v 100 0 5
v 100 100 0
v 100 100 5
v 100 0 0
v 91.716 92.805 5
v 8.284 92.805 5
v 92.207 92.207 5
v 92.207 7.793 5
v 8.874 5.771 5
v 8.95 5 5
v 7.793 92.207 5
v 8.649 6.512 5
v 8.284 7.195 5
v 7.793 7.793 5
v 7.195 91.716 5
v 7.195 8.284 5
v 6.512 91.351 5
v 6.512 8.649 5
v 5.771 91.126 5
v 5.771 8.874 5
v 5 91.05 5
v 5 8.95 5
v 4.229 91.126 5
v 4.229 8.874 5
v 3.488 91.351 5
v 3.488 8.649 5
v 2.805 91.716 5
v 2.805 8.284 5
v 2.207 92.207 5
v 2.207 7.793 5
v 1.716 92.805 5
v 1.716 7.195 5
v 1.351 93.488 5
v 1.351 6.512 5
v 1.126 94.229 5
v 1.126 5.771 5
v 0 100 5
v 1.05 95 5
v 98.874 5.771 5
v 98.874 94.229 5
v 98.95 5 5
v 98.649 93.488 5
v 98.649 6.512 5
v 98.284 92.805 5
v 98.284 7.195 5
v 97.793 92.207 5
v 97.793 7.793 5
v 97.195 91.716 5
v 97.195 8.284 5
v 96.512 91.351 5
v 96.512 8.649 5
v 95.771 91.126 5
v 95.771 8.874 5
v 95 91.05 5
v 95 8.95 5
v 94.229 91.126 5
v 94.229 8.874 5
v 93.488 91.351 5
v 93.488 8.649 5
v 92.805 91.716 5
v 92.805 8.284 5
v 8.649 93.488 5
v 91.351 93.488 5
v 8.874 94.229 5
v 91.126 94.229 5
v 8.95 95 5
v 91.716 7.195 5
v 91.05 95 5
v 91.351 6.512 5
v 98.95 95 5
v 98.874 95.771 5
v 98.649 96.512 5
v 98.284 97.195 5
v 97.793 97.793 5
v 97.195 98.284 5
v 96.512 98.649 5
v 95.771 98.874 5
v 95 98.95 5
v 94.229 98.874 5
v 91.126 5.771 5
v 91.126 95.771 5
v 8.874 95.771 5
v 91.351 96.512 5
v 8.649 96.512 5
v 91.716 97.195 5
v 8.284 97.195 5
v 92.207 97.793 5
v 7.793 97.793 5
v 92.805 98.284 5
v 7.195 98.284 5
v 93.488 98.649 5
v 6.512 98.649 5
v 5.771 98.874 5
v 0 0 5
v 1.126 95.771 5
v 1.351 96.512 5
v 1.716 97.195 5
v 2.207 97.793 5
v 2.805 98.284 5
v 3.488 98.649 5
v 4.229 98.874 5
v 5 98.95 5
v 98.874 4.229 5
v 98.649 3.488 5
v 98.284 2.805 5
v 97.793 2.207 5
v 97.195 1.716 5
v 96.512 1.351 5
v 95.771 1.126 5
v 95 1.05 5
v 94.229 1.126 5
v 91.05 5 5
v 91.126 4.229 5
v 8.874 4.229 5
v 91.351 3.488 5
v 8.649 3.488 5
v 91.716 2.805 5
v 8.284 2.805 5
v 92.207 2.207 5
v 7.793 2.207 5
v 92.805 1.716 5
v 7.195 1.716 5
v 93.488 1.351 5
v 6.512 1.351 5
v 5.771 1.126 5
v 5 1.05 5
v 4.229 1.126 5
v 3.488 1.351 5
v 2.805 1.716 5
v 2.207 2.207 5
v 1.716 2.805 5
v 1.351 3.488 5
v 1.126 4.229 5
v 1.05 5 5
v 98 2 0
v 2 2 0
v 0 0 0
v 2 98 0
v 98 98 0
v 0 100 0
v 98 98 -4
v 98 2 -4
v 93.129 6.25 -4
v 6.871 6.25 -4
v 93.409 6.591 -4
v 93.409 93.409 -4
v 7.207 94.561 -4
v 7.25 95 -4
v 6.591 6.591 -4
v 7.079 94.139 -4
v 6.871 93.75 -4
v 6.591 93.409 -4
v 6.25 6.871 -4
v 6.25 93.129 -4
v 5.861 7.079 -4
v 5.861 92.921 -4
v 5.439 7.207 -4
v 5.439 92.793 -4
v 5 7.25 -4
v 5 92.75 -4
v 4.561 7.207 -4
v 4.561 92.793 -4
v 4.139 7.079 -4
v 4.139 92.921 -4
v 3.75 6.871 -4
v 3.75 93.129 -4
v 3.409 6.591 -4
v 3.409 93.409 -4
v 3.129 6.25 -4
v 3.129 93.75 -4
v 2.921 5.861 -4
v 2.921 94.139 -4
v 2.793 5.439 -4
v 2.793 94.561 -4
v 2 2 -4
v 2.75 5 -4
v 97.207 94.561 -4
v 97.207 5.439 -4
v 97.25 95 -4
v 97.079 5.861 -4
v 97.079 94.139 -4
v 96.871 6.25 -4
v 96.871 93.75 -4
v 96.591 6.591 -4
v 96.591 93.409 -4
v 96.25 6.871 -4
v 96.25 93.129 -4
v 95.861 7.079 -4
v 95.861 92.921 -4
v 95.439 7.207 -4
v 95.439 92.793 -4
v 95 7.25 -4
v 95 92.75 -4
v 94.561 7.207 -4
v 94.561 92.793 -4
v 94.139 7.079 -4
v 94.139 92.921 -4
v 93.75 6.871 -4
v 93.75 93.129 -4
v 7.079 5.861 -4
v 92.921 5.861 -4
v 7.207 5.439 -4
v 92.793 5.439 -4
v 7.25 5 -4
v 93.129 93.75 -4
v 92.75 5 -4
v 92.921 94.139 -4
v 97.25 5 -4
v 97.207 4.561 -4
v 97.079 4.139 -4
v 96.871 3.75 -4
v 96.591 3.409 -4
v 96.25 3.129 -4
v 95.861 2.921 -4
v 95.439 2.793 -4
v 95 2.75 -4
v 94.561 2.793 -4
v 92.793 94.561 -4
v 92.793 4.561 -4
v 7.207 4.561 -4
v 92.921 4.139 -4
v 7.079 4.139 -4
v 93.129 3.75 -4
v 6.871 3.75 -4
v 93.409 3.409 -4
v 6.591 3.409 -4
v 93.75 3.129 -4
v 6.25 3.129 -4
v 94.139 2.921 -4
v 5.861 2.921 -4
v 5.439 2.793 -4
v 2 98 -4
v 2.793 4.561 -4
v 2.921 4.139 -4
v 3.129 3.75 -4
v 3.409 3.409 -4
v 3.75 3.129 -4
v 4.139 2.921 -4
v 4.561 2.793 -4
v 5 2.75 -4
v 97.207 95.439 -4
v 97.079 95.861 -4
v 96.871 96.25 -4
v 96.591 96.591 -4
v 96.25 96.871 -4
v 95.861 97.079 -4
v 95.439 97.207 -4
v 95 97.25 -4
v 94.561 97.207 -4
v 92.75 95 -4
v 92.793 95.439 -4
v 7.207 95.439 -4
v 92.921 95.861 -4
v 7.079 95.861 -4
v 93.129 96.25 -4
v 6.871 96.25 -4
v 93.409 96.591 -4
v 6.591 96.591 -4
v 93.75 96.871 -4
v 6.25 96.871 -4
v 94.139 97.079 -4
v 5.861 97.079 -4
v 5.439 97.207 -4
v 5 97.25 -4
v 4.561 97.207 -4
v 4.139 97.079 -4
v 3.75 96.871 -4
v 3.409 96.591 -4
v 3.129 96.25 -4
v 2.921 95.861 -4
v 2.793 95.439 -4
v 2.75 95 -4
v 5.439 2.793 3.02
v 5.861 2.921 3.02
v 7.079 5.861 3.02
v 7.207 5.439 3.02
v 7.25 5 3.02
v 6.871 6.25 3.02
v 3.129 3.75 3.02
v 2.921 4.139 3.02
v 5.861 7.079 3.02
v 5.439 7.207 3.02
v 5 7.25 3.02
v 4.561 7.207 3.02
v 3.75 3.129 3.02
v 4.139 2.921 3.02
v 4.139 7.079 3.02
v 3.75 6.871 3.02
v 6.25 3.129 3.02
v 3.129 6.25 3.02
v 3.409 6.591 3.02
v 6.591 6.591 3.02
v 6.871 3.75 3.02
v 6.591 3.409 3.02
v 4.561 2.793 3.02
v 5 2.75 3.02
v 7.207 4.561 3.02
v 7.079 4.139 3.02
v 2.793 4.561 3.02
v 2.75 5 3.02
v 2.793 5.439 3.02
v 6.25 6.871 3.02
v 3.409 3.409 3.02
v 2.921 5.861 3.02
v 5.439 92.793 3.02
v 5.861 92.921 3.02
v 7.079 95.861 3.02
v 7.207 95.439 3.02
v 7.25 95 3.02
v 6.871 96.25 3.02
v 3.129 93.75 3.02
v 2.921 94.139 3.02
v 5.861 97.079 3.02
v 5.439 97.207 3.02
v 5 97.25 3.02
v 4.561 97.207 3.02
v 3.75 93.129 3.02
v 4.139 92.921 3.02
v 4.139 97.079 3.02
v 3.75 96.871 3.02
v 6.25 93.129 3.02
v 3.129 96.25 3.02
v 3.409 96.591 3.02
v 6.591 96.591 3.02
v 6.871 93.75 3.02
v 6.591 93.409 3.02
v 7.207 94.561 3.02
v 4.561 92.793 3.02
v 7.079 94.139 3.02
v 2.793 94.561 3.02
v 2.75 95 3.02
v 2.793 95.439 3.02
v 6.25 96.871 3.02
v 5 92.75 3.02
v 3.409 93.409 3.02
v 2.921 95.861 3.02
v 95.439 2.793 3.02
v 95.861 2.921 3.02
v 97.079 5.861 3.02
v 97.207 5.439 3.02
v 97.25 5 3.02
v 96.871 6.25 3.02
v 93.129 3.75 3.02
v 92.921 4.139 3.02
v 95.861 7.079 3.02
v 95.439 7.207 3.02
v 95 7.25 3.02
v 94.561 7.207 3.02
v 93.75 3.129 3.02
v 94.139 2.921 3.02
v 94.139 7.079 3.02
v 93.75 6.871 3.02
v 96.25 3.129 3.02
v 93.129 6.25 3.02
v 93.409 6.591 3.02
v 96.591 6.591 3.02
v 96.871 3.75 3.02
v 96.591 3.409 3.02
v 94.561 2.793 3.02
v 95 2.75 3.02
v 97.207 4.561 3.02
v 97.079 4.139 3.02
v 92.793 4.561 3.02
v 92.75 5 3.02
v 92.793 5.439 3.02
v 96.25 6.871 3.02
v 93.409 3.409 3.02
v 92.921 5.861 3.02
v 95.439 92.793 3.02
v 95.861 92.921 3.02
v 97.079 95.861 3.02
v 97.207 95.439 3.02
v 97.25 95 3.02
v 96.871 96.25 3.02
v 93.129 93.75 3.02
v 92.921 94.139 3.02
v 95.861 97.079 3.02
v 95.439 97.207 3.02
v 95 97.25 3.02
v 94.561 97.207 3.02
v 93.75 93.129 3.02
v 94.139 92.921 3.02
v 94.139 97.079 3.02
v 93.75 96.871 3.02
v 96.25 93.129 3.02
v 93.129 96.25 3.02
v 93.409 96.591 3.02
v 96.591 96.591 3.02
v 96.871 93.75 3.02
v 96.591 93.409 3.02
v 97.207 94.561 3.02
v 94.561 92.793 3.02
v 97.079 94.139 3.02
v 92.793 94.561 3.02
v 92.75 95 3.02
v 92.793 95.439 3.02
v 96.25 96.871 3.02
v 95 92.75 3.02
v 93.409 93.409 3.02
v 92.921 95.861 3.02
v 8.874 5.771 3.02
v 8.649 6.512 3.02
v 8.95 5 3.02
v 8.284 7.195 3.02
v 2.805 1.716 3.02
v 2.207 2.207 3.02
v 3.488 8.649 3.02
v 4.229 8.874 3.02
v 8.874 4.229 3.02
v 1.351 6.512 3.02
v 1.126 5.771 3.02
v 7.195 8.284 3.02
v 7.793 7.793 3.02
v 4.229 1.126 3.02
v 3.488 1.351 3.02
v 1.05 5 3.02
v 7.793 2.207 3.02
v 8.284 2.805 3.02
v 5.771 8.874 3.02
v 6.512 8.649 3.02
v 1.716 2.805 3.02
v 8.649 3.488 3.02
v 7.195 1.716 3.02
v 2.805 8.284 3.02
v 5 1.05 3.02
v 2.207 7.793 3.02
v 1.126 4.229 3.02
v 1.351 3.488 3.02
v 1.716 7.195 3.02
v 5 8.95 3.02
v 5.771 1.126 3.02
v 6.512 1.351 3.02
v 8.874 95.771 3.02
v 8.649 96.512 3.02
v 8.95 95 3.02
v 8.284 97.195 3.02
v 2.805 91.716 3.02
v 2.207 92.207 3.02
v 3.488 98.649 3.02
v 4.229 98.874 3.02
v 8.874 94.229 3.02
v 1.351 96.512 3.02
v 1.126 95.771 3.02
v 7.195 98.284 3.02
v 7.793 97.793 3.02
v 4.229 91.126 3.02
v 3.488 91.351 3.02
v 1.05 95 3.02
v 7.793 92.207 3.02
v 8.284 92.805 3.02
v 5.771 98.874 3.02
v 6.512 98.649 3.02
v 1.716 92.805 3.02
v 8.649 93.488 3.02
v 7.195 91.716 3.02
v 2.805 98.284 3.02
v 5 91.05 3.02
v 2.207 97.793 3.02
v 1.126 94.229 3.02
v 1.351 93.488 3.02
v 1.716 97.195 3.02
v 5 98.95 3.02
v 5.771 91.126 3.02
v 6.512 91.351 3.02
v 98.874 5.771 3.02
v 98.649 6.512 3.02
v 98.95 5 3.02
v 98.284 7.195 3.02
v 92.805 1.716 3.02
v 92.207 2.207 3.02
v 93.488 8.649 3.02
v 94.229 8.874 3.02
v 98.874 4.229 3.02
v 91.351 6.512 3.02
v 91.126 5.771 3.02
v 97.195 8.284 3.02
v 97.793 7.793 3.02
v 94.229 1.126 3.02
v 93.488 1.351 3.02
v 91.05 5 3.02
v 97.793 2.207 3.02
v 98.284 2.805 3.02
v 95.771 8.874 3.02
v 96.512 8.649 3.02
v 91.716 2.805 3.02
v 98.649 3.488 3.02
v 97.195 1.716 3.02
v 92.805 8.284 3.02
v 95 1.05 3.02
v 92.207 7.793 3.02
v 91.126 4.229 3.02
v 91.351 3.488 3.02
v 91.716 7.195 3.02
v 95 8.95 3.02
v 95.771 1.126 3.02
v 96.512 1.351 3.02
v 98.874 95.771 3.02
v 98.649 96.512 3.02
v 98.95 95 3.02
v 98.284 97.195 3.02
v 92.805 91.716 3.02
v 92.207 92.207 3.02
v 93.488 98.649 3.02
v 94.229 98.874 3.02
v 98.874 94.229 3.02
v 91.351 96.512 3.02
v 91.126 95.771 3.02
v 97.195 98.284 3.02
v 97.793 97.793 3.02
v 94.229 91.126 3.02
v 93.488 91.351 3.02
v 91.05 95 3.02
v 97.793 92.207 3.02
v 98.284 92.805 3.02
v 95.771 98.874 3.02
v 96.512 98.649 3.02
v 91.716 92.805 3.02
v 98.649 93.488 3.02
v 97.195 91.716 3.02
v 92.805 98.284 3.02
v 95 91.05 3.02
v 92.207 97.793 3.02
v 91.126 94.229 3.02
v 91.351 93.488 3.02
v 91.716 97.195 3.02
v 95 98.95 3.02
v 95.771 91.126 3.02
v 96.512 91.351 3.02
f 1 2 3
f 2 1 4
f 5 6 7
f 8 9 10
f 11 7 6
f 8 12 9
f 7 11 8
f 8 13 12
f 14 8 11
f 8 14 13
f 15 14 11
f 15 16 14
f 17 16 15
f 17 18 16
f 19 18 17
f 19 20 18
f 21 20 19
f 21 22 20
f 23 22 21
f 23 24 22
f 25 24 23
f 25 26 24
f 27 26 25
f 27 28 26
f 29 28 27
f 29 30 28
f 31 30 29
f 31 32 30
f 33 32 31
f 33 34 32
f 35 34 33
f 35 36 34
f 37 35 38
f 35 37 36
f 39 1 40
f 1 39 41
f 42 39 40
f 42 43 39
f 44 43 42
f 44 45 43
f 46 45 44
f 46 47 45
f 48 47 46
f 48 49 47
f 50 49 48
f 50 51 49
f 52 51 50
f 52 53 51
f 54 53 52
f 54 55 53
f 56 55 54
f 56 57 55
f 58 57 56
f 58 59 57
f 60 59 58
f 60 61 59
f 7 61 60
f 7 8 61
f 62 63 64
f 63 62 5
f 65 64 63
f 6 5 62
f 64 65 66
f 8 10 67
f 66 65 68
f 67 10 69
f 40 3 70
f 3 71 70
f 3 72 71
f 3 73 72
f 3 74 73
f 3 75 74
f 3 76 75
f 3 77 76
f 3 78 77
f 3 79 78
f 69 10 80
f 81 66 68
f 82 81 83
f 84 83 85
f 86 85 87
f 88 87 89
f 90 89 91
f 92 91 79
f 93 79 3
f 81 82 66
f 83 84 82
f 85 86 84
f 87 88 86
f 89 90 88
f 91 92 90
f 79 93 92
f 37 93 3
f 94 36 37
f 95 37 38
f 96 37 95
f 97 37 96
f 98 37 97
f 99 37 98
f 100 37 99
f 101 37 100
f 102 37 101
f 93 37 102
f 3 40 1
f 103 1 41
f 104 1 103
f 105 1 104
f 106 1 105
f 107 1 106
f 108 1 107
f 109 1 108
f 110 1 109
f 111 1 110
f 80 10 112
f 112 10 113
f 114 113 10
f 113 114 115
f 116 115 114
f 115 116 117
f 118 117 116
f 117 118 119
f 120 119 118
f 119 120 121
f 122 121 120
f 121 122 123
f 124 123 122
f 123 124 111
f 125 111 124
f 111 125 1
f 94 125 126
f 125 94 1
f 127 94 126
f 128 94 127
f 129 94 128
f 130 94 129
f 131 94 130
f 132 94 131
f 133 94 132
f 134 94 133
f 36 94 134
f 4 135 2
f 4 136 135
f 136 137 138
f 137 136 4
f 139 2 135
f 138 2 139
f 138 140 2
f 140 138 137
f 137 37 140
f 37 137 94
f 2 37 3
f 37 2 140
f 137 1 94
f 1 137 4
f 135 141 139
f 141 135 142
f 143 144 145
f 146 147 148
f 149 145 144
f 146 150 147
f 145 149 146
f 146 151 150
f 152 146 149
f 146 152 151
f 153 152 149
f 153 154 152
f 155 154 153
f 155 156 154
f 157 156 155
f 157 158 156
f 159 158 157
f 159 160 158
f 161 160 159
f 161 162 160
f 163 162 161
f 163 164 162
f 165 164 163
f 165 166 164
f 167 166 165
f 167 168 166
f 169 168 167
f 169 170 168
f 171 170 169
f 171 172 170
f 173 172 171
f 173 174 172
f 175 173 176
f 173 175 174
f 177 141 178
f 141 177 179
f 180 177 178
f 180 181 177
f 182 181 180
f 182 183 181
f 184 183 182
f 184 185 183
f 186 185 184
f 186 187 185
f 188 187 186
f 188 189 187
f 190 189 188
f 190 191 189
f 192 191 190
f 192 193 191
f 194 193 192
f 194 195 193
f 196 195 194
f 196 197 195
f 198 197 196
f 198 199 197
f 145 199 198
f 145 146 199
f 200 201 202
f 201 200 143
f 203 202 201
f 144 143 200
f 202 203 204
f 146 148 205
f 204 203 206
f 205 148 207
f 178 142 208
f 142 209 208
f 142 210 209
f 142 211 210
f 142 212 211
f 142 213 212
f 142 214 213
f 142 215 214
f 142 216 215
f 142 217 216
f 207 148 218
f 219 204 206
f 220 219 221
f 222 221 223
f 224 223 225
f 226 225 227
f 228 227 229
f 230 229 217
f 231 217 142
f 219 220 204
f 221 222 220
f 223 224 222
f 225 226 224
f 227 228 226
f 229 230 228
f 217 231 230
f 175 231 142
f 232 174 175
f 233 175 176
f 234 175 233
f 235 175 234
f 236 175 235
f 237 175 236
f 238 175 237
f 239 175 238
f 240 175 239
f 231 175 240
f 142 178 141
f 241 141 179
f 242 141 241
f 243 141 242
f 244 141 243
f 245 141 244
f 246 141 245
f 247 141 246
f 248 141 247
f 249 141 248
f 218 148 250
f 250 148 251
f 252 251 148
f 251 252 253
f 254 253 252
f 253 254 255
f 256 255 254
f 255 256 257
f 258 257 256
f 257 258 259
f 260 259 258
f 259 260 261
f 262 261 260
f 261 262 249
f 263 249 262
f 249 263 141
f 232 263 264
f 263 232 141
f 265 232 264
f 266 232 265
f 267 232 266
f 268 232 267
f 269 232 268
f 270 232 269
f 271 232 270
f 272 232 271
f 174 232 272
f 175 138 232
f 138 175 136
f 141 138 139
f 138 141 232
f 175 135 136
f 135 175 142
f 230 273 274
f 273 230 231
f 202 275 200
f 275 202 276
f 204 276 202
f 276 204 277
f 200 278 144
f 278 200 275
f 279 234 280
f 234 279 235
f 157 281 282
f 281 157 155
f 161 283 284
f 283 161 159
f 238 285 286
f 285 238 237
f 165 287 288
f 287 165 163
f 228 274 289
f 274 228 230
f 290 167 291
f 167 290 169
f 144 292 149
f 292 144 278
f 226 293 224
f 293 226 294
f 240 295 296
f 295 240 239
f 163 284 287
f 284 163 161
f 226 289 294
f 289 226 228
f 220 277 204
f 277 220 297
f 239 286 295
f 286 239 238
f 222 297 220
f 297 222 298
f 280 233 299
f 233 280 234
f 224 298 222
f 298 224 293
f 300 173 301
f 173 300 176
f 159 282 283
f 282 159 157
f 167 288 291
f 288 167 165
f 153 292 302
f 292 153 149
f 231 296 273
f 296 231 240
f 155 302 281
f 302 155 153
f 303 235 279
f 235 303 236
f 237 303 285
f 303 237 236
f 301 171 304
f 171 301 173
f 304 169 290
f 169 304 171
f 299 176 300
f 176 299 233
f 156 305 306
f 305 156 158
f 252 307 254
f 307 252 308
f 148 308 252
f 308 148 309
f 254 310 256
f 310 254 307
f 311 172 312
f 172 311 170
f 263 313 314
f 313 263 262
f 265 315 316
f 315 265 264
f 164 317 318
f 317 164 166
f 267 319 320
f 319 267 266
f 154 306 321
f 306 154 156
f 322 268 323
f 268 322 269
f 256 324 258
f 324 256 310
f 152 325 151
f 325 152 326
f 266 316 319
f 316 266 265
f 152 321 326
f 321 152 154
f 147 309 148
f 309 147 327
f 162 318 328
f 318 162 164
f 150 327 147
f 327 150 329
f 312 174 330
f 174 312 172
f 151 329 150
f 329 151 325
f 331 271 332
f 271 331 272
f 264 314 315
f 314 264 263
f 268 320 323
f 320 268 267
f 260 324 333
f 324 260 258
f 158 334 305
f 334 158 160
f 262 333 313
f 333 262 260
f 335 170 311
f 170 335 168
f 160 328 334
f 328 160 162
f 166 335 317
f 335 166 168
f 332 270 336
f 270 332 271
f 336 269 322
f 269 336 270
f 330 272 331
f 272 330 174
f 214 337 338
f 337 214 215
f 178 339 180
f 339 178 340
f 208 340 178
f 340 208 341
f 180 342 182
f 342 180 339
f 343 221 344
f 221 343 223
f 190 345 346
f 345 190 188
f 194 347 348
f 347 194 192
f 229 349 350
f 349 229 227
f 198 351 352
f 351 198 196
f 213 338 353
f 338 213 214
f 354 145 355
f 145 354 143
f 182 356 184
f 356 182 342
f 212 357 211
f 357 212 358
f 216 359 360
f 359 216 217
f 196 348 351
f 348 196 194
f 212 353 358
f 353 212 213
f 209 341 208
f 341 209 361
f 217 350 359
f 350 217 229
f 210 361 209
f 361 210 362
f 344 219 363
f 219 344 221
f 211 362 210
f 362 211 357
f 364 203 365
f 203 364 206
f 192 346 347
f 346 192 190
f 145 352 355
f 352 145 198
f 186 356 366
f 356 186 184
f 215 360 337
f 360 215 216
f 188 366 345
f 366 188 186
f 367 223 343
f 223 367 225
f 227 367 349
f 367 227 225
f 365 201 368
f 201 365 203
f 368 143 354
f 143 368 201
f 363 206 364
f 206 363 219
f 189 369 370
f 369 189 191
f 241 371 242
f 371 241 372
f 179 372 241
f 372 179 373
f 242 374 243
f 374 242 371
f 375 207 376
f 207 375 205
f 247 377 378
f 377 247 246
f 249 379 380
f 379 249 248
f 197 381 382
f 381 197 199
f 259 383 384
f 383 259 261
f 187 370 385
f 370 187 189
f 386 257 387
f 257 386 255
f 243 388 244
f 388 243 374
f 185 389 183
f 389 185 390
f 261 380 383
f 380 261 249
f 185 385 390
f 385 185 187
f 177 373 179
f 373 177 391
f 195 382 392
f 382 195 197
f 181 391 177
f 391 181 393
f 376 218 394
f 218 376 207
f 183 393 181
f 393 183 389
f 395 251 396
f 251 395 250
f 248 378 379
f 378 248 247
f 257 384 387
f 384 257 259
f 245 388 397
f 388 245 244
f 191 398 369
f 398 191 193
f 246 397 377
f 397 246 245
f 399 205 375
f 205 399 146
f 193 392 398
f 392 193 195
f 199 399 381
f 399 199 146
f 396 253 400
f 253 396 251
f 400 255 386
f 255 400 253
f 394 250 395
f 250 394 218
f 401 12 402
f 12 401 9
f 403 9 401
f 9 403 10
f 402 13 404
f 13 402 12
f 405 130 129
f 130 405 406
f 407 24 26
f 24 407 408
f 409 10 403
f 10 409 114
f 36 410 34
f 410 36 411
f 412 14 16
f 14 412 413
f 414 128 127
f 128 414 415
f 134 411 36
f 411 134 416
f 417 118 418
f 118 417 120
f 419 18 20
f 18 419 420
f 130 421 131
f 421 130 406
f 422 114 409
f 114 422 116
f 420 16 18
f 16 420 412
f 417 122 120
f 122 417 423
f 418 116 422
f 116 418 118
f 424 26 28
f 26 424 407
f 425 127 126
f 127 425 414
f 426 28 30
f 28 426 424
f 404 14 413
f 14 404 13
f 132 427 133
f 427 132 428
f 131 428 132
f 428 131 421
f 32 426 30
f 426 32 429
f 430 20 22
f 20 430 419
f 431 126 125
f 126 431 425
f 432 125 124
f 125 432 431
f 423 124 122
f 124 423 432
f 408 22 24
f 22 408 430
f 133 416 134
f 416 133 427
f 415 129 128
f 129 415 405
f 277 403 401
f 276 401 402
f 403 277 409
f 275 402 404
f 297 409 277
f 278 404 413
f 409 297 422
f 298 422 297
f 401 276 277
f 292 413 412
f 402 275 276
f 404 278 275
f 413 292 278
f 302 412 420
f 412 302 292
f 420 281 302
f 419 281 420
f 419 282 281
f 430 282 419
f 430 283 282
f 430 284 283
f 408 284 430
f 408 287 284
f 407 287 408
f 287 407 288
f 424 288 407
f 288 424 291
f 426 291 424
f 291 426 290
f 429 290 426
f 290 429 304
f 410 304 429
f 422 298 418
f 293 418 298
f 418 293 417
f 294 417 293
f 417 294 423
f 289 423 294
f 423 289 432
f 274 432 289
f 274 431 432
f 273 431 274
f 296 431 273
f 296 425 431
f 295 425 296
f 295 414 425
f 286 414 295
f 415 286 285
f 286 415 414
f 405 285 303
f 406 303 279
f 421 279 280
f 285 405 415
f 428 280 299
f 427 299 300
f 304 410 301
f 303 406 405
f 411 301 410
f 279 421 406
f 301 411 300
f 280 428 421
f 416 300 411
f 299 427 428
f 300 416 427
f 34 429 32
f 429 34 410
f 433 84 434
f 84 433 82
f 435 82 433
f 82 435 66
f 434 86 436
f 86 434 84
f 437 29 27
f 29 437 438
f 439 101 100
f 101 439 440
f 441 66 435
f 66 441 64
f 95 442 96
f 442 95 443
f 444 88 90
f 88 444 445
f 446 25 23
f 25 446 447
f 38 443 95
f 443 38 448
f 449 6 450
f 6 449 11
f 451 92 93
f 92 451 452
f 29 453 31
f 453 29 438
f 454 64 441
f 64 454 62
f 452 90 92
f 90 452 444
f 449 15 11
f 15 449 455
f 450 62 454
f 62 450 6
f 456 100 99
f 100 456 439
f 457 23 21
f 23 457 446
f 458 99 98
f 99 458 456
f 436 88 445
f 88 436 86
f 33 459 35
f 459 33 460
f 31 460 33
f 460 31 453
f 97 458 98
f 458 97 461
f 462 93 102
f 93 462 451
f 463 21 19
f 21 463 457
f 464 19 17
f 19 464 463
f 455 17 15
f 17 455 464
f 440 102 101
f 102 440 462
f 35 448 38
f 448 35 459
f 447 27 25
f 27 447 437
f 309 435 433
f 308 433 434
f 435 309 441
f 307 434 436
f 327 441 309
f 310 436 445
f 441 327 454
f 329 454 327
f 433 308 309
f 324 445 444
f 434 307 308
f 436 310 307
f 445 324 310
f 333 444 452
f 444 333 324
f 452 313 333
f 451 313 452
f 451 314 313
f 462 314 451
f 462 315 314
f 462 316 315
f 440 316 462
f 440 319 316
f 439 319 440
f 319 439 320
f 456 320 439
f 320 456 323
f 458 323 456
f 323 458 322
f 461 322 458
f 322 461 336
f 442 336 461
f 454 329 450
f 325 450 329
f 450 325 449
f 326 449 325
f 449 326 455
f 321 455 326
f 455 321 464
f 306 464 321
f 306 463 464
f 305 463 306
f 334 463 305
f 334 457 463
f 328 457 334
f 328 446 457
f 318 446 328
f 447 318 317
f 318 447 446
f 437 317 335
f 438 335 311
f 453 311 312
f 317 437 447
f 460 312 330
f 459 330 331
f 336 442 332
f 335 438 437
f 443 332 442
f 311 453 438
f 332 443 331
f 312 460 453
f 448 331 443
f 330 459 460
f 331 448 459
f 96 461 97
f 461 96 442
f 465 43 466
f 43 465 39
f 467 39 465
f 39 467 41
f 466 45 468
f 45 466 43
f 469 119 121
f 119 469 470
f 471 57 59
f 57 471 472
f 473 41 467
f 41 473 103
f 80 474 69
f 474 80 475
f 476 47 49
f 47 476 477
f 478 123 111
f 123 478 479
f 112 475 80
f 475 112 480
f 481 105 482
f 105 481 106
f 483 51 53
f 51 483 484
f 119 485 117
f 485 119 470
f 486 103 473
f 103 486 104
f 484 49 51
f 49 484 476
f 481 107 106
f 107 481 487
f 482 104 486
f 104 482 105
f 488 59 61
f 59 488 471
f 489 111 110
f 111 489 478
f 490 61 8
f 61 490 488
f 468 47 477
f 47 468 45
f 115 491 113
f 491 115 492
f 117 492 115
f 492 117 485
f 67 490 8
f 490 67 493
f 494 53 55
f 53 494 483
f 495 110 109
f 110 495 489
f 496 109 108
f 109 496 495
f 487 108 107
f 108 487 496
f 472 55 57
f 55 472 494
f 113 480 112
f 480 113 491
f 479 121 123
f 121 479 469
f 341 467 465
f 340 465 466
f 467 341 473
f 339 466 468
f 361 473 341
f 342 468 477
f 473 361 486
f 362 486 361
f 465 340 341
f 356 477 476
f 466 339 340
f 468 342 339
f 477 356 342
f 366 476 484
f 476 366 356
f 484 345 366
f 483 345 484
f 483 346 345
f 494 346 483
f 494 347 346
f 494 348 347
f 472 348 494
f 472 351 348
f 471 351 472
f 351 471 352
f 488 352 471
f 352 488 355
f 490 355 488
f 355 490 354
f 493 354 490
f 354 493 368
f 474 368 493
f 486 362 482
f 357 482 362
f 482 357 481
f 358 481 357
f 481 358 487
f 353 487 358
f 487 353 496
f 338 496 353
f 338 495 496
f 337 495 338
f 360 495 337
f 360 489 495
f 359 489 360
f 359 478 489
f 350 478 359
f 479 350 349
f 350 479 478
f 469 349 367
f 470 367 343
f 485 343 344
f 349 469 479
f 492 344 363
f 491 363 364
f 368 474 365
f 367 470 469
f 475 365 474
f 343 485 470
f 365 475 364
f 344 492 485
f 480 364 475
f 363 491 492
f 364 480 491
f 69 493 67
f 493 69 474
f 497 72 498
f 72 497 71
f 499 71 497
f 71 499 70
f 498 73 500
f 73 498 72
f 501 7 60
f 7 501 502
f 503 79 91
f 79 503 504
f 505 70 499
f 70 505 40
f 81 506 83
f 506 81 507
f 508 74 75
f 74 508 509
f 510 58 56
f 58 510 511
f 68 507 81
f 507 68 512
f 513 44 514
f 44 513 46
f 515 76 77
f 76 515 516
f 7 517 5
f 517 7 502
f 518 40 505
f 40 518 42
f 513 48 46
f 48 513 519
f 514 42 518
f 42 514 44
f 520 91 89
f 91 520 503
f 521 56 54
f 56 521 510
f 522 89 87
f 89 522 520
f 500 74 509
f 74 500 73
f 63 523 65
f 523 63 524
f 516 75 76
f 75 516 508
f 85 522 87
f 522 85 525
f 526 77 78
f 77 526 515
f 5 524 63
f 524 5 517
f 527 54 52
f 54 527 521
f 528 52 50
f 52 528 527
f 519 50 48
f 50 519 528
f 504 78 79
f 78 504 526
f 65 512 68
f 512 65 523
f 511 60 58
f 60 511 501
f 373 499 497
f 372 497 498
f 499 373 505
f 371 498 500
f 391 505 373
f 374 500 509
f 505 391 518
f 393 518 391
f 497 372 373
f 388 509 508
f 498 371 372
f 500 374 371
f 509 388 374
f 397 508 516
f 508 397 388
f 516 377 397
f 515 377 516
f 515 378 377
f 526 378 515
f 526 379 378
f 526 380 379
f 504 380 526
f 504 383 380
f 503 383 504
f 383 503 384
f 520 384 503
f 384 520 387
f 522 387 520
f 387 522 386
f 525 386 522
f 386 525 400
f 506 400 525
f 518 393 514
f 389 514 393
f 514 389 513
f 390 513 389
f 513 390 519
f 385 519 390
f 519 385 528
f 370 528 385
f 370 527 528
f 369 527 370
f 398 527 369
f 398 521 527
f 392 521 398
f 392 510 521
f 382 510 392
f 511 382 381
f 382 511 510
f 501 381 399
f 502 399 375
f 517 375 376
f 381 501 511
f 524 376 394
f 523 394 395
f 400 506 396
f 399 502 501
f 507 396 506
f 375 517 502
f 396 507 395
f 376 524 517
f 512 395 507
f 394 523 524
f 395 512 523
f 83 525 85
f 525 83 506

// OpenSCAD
$fn = 32;

// ----------------------------------------------------------------------
// Enclosure lid: 100 x 100 x 5 mm, 4 bolt holes
// ----------------------------------------------------------------------

// --- parameters (mm) ---
length = 100;             // lid length, X
width = 100;              // lid width, Y
plate_t = 5;              // lid plate thickness
bolt_d = 4.5;             // bolt clearance
boss_lip = 5;             // bolt hole inset from the corner
sink = 1;                 // overlap of the lip and ribs into the plate
lip_h = 5;                // lip height below the plate
lip_wall = 2;             // lip wall thickness
cs_d = 7.9;               // countersink diameter
cs_h = 1.98;              // countersink depth

module plate() {
  cube([length, width, plate_t]);
  /* lip that drops into the housing opening, sunk into the plate */
  translate([lip_wall, lip_wall, -lip_h + sink]) cube([length - 2 * lip_wall, width - 2 * lip_wall, lip_h]);
}

difference() {
  plate();
  /* bolt pattern matching the corner bosses */
  for (sx = [0, 1]) for (sy = [0, 1])
    translate([sx * (length - 2 * boss_lip) + boss_lip, sy * (width - 2 * boss_lip) + boss_lip, -lip_h - 1])
      cylinder(h = plate_t + lip_h + 2, d = bolt_d);
  /* countersinks so the heads sit flush */
  for (sx = [0, 1]) for (sy = [0, 1])
    translate([sx * (length - 2 * boss_lip) + boss_lip, sy * (width - 2 * boss_lip) + boss_lip, plate_t - cs_h])
      cylinder(h = cs_h + 0.5, d = cs_d);
}
